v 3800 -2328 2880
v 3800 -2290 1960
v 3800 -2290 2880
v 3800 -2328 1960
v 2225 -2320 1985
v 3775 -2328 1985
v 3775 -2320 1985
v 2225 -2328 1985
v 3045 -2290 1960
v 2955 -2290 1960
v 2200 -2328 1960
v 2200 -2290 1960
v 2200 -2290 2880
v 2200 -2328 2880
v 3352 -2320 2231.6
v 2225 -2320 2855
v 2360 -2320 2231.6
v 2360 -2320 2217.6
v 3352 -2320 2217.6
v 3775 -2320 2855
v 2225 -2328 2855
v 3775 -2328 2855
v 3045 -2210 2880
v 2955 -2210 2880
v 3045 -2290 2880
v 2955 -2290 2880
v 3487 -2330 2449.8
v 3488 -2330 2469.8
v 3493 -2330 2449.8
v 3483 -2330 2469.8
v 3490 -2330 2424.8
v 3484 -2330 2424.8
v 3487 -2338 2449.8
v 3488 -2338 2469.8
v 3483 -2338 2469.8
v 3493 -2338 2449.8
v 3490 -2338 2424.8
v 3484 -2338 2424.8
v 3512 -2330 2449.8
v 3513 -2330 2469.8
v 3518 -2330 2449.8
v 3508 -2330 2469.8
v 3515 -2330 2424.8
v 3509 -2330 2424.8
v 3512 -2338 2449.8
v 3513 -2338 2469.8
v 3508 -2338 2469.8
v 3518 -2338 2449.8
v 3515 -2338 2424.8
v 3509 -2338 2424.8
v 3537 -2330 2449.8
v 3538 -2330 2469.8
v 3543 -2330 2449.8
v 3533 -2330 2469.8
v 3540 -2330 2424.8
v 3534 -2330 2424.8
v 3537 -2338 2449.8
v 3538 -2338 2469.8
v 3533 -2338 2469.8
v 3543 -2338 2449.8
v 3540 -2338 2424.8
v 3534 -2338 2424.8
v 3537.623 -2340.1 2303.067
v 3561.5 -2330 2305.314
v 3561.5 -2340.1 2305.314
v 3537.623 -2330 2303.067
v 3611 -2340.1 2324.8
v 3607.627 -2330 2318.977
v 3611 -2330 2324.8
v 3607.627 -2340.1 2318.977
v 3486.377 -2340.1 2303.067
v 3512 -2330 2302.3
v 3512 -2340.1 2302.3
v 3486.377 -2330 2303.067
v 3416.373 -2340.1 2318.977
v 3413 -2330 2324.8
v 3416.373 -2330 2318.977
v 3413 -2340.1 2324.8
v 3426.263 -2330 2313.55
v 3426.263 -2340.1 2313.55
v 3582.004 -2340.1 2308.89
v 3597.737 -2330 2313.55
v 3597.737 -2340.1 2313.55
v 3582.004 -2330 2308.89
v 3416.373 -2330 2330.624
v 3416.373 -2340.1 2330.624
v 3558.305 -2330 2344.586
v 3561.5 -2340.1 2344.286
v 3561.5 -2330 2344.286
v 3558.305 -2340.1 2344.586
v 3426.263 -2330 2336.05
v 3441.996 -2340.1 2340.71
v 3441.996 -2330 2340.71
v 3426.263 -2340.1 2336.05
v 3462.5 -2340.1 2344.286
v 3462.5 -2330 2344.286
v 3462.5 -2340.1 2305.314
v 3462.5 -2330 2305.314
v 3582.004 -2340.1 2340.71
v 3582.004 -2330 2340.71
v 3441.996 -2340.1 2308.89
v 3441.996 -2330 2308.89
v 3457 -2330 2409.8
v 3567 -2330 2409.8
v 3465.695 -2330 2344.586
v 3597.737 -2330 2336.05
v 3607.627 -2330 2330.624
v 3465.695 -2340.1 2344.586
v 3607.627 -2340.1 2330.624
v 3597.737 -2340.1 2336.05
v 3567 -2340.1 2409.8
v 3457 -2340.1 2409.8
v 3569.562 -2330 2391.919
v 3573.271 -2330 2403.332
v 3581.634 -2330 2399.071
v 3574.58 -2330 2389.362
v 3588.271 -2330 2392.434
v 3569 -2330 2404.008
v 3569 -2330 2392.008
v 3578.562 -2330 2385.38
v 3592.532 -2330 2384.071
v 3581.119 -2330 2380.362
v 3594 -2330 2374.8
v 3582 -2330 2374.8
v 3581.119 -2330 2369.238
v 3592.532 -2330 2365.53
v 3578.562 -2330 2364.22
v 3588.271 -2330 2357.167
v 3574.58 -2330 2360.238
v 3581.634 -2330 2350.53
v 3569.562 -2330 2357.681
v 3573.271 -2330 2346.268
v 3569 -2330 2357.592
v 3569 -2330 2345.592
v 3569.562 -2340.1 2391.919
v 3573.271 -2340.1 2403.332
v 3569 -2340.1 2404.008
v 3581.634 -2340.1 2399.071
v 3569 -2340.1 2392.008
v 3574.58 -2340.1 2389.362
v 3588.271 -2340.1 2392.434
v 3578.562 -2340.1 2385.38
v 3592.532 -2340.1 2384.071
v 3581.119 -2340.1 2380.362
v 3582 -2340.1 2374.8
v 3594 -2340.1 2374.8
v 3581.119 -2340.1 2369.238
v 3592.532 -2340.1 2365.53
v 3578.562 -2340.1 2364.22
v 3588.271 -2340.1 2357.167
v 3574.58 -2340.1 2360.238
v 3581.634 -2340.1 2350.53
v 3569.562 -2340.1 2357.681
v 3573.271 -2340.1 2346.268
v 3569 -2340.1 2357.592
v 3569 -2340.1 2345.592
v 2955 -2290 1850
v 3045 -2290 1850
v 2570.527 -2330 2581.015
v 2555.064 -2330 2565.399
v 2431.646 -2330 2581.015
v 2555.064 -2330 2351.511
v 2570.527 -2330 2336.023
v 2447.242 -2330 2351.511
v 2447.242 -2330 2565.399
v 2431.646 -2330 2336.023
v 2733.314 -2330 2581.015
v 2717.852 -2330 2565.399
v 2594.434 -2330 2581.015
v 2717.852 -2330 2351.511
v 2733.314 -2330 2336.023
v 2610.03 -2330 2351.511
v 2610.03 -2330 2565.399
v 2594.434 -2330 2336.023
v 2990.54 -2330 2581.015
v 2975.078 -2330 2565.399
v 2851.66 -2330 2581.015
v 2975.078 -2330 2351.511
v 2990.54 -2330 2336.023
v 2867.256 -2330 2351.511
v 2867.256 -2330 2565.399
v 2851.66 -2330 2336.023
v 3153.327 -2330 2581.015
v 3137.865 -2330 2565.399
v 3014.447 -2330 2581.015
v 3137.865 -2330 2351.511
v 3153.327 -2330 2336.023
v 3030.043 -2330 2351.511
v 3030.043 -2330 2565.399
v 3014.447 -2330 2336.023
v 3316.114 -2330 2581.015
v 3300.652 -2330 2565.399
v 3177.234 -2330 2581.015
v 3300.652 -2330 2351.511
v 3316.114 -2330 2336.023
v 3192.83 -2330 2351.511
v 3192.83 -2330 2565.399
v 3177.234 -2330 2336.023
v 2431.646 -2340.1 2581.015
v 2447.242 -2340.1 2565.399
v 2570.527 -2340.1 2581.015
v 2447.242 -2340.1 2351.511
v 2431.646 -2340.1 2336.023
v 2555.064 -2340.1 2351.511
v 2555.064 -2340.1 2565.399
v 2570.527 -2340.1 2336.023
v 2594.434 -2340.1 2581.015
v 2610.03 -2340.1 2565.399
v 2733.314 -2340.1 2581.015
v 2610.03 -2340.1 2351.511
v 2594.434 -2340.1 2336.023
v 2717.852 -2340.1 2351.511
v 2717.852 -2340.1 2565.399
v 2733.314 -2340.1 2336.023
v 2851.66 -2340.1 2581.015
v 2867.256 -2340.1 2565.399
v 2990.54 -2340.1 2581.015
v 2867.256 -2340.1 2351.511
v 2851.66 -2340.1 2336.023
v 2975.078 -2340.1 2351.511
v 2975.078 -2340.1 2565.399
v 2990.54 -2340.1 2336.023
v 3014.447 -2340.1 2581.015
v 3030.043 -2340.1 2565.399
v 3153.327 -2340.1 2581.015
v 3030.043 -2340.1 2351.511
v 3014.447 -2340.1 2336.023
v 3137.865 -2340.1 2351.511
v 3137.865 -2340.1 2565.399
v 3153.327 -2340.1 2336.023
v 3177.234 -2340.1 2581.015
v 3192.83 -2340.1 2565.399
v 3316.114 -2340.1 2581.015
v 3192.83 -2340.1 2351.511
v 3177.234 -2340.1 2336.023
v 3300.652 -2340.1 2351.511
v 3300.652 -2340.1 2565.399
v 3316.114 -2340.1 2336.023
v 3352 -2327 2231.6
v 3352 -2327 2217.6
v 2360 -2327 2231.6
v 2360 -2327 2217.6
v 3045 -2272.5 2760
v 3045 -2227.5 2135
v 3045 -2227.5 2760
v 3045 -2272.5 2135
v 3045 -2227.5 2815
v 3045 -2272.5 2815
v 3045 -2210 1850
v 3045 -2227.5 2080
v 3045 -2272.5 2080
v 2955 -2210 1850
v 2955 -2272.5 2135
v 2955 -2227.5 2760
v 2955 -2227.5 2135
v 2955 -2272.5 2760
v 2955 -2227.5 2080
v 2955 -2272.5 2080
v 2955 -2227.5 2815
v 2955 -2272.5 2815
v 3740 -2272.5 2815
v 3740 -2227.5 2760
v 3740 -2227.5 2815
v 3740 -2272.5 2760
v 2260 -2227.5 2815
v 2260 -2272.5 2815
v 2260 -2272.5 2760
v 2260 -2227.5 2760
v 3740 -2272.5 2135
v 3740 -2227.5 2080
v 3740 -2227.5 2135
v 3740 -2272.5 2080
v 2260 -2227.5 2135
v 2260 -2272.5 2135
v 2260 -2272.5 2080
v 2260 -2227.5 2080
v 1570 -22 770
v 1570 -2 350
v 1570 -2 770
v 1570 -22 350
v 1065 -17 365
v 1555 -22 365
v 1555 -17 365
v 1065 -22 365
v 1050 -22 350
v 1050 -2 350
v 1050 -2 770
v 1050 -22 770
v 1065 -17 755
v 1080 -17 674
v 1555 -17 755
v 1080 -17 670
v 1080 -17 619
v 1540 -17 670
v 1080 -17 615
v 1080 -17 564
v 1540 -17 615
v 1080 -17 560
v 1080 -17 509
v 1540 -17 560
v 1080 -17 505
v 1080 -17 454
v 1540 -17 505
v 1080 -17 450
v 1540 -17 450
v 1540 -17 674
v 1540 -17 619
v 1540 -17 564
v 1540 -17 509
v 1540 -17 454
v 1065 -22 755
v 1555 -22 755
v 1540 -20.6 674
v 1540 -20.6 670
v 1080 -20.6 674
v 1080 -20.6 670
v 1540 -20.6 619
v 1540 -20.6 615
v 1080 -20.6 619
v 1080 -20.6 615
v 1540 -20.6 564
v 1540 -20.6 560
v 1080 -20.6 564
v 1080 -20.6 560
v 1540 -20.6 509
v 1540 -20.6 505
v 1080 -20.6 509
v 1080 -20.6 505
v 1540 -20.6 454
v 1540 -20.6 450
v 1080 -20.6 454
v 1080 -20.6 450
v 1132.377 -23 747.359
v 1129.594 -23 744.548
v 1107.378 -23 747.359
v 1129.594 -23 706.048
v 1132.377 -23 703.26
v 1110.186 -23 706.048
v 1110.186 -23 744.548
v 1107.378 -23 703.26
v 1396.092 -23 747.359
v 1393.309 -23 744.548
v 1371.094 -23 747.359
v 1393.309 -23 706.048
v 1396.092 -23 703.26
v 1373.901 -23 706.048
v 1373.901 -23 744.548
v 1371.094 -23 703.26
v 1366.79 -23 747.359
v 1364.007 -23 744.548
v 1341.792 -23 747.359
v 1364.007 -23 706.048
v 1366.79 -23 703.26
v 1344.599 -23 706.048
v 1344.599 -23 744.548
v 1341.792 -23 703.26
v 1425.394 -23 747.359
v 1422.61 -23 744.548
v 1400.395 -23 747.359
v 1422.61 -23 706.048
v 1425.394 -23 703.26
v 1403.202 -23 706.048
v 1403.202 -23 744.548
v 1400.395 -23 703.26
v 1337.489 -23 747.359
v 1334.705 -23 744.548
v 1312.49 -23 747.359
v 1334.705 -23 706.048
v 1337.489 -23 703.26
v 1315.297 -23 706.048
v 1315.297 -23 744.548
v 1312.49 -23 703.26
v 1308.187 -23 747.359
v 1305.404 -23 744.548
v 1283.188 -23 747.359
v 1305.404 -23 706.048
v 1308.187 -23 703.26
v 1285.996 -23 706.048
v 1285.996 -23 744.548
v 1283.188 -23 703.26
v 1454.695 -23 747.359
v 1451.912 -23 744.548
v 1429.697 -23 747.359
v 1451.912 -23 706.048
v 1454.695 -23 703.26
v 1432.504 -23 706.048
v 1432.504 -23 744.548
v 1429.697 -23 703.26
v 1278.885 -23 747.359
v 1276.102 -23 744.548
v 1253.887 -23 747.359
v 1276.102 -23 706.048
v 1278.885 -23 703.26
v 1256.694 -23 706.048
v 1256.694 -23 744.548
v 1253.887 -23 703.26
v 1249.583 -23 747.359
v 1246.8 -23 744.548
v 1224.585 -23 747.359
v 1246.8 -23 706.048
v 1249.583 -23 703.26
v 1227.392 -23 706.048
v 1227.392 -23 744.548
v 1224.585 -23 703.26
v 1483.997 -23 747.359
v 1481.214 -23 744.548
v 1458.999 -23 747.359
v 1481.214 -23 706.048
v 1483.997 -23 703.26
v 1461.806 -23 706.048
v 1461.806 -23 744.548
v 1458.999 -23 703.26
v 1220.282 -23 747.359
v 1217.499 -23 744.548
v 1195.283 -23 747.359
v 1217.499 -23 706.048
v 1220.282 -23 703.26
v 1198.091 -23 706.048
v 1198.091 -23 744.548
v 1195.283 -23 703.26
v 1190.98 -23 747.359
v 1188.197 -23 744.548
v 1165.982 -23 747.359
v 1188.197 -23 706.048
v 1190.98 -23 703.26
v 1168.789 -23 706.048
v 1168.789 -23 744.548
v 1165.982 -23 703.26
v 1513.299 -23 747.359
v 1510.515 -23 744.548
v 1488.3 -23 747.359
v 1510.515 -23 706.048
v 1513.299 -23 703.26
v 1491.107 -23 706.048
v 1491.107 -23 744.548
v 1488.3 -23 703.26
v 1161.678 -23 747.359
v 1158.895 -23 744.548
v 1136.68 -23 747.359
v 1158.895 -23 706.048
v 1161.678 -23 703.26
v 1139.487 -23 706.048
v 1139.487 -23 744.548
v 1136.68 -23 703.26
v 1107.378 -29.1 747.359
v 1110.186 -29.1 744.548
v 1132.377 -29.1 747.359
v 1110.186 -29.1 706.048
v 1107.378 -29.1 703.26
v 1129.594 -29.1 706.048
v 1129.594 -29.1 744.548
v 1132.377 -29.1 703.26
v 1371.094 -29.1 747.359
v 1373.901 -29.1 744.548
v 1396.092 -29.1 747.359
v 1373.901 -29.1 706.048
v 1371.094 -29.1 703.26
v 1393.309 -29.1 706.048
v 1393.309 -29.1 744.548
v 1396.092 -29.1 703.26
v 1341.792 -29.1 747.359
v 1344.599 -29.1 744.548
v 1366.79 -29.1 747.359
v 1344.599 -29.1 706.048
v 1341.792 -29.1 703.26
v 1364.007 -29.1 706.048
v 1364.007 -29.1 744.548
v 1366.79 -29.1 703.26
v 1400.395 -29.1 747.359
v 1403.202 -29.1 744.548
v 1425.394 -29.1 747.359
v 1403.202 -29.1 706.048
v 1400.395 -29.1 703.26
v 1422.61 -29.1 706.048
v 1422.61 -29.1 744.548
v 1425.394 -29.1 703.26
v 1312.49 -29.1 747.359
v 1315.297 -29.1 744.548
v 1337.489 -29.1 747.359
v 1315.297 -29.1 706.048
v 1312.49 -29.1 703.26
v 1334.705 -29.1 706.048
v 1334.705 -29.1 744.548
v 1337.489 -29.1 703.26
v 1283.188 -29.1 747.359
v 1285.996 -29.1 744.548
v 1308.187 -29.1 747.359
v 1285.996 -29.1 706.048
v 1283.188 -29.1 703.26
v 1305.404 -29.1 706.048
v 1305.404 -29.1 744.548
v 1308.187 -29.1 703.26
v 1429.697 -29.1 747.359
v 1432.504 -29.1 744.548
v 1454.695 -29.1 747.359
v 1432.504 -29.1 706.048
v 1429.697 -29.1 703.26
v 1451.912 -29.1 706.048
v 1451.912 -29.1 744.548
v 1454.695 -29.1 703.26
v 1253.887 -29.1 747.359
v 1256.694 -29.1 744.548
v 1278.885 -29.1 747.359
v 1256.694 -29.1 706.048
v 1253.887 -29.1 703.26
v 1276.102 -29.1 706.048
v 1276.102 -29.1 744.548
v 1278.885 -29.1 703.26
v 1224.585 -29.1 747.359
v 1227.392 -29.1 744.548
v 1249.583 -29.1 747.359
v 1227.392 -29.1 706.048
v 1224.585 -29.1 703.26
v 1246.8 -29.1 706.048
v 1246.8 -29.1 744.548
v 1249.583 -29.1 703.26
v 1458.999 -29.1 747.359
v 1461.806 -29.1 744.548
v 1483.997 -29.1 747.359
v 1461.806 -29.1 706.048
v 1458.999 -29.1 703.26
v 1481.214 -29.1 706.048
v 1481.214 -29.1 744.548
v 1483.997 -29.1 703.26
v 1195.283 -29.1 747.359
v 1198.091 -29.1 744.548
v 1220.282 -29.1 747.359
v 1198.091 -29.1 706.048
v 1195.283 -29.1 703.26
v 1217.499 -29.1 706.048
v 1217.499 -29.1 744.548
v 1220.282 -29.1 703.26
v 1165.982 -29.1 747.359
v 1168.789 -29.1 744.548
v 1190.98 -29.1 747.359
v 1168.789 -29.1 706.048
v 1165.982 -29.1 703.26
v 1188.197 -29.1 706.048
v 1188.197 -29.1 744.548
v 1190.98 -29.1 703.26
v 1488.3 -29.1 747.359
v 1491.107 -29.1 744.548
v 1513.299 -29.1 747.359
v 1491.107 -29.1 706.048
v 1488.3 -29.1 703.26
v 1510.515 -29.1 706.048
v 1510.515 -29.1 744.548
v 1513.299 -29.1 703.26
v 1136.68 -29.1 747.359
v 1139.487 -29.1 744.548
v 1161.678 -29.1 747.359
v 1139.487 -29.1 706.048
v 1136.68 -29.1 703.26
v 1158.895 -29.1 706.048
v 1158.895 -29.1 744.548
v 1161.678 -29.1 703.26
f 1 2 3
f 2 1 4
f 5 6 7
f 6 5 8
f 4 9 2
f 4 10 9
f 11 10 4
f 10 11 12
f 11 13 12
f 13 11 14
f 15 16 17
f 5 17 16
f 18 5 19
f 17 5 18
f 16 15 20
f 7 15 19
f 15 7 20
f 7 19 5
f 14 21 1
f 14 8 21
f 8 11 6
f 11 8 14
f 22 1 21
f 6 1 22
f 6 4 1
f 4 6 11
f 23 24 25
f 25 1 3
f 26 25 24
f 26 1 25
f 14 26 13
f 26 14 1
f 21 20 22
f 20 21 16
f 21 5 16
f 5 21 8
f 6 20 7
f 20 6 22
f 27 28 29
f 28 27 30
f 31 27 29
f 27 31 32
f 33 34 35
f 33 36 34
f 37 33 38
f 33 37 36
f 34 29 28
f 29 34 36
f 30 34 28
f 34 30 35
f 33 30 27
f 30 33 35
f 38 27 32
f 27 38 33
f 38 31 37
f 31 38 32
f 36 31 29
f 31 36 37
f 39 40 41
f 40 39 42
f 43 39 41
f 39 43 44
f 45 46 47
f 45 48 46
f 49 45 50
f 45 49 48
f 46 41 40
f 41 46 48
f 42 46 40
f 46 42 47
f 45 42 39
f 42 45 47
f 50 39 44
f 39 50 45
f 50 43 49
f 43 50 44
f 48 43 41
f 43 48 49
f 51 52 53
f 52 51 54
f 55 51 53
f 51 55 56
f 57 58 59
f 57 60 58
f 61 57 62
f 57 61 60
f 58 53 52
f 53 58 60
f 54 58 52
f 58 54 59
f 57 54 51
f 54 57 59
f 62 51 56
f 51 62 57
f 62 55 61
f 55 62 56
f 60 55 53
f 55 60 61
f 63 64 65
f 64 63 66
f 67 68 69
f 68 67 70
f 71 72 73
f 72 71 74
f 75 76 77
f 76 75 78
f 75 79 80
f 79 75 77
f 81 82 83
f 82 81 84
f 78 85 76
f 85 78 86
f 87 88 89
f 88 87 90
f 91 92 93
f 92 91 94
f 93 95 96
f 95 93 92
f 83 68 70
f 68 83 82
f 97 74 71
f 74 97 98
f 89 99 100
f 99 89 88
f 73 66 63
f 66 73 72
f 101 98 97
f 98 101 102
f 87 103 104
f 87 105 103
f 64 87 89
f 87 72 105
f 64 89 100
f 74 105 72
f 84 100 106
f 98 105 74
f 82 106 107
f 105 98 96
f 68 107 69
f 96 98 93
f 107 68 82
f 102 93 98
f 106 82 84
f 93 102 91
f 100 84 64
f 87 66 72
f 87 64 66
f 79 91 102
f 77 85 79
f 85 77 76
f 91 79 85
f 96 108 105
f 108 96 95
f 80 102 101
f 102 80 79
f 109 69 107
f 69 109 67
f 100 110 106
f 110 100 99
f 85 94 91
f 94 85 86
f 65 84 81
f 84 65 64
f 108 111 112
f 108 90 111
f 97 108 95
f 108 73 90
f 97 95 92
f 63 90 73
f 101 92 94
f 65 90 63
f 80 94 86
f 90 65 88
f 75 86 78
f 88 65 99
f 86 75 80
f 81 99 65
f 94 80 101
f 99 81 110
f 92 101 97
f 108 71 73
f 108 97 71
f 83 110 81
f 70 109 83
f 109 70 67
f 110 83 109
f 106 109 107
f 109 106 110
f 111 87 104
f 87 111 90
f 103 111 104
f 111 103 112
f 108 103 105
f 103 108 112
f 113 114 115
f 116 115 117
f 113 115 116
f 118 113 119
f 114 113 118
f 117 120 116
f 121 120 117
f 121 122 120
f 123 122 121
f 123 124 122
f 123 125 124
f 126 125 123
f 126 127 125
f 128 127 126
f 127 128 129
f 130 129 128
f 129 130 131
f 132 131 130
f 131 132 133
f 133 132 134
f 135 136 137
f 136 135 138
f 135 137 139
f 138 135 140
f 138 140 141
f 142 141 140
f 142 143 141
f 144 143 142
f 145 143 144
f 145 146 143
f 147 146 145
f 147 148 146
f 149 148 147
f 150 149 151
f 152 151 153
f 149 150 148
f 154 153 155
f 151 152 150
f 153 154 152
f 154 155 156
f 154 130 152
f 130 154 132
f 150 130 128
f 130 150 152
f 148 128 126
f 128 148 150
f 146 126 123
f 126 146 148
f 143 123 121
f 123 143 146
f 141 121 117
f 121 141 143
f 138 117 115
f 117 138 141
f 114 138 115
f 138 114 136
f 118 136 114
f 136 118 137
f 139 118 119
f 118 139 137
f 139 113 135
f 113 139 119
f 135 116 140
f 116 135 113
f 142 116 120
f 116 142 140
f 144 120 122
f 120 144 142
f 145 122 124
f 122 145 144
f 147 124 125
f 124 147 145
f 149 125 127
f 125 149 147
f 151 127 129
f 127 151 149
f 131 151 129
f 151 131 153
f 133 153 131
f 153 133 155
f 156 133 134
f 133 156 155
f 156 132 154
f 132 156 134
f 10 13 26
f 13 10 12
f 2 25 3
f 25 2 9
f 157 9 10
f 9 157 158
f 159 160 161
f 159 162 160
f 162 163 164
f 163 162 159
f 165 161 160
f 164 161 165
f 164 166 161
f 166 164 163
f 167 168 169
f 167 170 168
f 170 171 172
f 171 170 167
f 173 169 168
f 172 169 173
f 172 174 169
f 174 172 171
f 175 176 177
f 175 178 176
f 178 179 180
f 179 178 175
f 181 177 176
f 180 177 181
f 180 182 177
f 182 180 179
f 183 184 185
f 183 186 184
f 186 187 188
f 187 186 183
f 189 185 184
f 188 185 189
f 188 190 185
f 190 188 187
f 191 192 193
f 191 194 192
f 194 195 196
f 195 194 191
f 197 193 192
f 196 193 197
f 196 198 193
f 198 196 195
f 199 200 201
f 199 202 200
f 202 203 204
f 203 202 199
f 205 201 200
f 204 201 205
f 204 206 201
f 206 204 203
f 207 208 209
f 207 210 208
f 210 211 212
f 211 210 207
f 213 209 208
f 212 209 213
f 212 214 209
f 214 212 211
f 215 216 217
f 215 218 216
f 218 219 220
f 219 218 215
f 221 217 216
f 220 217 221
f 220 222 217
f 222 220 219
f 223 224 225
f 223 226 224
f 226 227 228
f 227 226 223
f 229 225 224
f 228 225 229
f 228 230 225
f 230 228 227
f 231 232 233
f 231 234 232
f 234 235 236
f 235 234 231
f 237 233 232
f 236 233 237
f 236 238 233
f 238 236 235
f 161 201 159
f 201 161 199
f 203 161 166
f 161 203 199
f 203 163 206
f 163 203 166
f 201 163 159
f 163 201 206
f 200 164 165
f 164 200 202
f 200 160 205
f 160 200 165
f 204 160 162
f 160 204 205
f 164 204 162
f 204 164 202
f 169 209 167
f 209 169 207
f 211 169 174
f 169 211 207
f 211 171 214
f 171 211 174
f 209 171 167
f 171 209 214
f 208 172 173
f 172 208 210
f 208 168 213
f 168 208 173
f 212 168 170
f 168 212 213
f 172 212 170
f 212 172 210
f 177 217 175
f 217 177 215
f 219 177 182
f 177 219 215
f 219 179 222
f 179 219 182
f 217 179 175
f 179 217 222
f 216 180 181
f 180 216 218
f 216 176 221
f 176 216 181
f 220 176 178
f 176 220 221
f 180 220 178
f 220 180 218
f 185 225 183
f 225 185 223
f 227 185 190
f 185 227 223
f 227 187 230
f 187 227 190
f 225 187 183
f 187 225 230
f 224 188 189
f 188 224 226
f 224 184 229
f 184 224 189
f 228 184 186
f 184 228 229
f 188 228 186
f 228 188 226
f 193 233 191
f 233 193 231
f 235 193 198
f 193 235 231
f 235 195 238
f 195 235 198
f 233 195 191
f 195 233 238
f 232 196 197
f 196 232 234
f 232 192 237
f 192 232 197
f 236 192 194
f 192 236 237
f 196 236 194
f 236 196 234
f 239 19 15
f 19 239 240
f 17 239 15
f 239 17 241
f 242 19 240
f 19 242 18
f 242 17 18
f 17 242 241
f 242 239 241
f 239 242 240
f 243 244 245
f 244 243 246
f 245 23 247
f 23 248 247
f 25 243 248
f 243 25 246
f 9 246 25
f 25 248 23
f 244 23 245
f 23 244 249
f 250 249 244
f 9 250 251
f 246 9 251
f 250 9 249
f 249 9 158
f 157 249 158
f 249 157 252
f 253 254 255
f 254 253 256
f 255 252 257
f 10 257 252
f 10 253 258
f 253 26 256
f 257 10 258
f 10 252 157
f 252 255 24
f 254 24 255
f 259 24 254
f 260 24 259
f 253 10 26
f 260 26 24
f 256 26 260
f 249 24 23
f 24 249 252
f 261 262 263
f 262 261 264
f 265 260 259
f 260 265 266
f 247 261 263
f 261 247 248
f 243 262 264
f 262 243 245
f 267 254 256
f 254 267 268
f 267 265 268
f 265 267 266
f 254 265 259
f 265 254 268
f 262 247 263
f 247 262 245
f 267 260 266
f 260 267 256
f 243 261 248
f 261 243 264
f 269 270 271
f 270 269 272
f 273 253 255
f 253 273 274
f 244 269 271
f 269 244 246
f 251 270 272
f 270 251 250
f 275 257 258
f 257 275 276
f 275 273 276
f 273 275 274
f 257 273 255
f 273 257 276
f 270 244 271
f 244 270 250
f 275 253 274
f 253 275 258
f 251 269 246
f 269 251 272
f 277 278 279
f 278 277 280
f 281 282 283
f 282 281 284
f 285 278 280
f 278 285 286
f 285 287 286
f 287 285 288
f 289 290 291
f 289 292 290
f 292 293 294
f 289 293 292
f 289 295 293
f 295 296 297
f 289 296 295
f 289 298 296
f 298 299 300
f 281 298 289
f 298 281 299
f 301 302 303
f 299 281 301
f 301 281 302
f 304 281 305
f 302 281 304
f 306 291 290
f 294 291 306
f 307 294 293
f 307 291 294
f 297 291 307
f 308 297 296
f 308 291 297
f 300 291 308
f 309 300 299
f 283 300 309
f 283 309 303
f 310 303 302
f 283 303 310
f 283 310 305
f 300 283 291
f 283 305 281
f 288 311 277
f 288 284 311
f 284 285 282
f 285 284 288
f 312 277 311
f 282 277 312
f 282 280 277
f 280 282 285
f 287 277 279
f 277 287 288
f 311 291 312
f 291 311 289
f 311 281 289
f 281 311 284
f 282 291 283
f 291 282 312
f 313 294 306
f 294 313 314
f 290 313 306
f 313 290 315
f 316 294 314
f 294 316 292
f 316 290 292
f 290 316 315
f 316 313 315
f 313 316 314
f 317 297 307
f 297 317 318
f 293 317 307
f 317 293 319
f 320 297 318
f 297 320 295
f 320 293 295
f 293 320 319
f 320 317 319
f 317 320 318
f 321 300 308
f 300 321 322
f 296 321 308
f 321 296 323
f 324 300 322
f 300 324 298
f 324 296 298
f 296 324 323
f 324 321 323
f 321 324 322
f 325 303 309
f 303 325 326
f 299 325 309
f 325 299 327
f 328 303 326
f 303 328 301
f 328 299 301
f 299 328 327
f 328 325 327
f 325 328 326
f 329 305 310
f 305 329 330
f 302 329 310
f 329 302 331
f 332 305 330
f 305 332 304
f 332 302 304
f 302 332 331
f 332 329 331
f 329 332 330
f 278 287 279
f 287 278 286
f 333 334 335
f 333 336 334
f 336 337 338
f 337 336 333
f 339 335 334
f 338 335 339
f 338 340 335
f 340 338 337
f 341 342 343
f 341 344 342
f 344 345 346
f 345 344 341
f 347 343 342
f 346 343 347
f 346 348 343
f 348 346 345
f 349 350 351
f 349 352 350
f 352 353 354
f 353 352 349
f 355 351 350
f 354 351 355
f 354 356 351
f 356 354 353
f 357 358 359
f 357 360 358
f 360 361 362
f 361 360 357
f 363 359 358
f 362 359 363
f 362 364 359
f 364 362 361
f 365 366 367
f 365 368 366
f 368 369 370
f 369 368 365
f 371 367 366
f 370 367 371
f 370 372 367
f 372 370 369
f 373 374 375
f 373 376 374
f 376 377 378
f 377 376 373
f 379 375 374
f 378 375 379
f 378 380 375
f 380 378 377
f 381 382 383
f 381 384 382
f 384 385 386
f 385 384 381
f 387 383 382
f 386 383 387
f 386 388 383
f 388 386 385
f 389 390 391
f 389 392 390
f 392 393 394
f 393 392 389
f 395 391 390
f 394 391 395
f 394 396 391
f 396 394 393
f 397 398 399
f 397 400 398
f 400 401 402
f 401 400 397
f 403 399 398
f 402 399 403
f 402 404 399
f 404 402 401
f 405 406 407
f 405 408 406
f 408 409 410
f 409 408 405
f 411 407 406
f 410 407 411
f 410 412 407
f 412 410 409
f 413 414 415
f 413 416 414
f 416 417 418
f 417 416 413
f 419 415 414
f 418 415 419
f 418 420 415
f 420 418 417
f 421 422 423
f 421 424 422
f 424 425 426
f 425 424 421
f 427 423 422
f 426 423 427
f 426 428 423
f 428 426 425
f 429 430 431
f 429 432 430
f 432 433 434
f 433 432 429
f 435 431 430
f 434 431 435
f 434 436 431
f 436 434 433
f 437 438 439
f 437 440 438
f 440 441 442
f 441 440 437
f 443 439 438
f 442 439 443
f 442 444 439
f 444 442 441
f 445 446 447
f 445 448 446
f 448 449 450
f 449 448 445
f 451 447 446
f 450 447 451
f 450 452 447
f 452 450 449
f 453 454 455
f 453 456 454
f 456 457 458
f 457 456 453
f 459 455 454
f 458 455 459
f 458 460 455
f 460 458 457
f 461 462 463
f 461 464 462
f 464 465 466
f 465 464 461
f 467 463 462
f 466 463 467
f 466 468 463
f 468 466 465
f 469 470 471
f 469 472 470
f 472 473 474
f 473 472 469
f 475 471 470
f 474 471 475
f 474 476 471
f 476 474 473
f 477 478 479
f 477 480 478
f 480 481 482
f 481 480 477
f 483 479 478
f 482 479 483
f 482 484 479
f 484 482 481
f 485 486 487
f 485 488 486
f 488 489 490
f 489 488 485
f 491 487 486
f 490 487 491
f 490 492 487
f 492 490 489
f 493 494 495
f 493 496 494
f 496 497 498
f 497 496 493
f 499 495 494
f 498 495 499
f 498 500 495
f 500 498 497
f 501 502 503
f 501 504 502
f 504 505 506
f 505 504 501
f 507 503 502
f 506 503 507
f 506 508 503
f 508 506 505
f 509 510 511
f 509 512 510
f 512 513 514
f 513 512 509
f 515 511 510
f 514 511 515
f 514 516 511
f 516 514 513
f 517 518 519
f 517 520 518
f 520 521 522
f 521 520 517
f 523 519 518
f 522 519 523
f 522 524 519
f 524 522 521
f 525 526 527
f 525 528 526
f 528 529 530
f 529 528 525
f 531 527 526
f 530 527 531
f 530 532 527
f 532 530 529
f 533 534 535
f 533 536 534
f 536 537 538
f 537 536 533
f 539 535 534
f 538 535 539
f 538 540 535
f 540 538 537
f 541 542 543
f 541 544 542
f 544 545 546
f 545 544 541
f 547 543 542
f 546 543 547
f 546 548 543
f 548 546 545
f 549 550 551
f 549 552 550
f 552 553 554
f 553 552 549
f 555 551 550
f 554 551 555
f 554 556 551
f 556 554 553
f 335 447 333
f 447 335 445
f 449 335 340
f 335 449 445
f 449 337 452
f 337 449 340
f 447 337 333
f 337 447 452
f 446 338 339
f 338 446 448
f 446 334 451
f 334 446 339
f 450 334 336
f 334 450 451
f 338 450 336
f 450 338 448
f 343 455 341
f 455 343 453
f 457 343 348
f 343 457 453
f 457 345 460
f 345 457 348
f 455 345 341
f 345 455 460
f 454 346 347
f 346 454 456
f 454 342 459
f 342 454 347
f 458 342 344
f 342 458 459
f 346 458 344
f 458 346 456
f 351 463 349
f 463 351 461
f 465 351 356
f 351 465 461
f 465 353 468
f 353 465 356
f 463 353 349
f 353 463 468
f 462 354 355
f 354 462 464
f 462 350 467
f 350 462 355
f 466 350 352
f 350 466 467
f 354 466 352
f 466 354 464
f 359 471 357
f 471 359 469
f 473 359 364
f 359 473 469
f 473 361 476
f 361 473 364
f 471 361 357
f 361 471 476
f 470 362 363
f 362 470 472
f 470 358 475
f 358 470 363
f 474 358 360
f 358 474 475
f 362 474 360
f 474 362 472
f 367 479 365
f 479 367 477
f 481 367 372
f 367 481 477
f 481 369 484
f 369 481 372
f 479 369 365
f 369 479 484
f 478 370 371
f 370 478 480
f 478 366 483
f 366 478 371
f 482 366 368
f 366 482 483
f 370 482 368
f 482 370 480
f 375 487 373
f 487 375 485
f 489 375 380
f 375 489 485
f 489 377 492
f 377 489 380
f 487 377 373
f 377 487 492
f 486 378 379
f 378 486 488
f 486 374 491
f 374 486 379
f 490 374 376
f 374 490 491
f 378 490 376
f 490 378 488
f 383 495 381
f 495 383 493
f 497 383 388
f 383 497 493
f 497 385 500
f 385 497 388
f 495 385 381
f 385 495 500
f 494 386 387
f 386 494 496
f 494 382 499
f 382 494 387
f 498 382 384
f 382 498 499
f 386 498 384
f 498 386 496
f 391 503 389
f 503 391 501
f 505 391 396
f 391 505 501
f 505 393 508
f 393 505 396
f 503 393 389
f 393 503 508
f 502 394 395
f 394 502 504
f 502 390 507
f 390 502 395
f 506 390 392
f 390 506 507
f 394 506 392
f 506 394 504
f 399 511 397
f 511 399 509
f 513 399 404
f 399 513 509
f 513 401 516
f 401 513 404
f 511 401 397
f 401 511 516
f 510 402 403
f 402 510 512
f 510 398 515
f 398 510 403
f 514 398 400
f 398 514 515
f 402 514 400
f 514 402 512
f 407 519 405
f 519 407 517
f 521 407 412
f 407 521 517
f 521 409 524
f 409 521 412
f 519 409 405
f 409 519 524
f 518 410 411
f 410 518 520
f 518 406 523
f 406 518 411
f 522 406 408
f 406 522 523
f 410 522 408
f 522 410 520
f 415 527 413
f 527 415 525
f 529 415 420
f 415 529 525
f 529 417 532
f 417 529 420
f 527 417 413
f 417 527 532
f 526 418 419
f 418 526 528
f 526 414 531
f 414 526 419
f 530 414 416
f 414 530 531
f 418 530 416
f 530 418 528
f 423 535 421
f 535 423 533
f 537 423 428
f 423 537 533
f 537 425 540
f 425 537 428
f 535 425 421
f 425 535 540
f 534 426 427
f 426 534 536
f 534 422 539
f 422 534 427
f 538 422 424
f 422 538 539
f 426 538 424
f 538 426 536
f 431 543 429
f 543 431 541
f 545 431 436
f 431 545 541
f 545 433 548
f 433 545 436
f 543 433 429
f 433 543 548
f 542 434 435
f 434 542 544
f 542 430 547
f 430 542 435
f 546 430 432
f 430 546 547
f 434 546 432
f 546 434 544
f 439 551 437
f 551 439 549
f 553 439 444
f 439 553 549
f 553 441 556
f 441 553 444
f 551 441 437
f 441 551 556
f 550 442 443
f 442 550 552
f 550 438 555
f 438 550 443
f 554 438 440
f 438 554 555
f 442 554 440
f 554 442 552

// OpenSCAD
// file: tea_shop_signage_parameters.scad
// =============================================================================
// TEA SHOP DIORAMA — SIGNAGE PARAMETERS (3D TAMIL "டீ கடை")
// =============================================================================
// All units: mm (1000 mm = 1.0 m), 1:1 real-world scale (1000 units = 1 GTA unit).
// Shared global coordinate system (identical to Groups 1–4):
//   +X -> left -> right  (0 = left outer wall, BUILD_W = right outer wall)
//   +Y -> front -> back  (0 = front eave wall, BUILD_D = back wall)
//   +Z -> up             (0 = ground / plinth top datum)
// =============================================================================

// --- SHARED GLOBAL VARIABLES (Reused from Groups 1–4) ------------------------
WALL_T             = 250;   // wall panel thickness
BUILD_W            = 6000;  // building width along X (6.00 m)
BUILD_D            = 4000;  // building depth along Y (4.00 m)
BACK_H             = 3200;  // wall height at BACK (tall side)
FRONT_H            = 2400;  // wall height at FRONT eave (short side)

// Group 1 front opening & plinth references:
left_pier_width    = 600;
window_width       = 3400;
mid_pier_width     = 500;
door_width         = 1000;
sill_height        = 900;

window_left        = left_pier_width;                   // 600 mm
window_right       = window_left + window_width;        // 4000 mm
door_left          = window_right + mid_pier_width;     // 4500 mm
door_right         = door_left + door_width;            // 5500 mm

// Group 2/3 roof slope derivation:
ROOF_RISE          = BACK_H - FRONT_H;                 // 800 mm
ROOF_RUN           = BUILD_D;                           // 4000 mm
ROOF_ANGLE         = atan(ROOF_RISE / ROOF_RUN);        // ~11.3099°

// Group 3 pergola structure references:
POST_SIZE          = 100;
POST_Y             = -2250;                             // front post line (mm)
MAIN_BEAM_WIDTH    = 80;
MAIN_BEAM_HEIGHT   = 120;
CROSS_BEAM_WIDTH   = 80;
CROSS_BEAM_HEIGHT  = 100;
PERGOLA_EAVE_Z     = FRONT_H;
POST_HEIGHT        = PERGOLA_EAVE_Z - abs(POST_Y) * tan(ROOF_ANGLE) - CROSS_BEAM_HEIGHT - MAIN_BEAM_HEIGHT;


// =============================================================================
// SIGNAGE PARAMETERS — ACCURATE SCALE & FACADE POSITIONING
// =============================================================================

// --- 1. Main Hanging Signboard ("டீ கடை") --------------------------------------
// REFERENCE OBSERVATIONS (Images 9b1fed6bc4, 0d34e93fe1, 9cc7378ff7):
// - Positioned centered directly on the front facade: X = BUILD_W / 2 = 3000 mm.
// - Dimensions: 1600 mm wide x 920 mm high, 30 mm thick base plate.
// - Raised outer protective rim border (25 mm wide, 8 mm projection).
// - 3D Tamil typography: "டீ கடை" (Tea Kadai) extruded in bold 3D letters.
// - Decorative separator line + authentic 3D tea cup graphic on right side.
// - Bottom edge rests directly on top of the front pergola canopy / beam line.
HANGING_SIGN_W     = 1600;  // signboard width along X (mm)
HANGING_SIGN_H     = 920;   // signboard height along Z (mm)
HANGING_SIGN_T     = 30;    // board base plate thickness along Y (mm)
HANGING_SIGN_RIM_W = 25;    // width of outer raised border frame (mm)
HANGING_SIGN_RIM_T = 8;     // projection of outer border frame (mm)
HANGING_SIGN_LET_T = 10;    // extrusion depth of 3D Tamil text & graphics (mm)

HANGING_SIGN_X     = BUILD_W / 2; // Centered at X = 3000 mm on front facade
HANGING_SIGN_Y     = POST_Y - MAIN_BEAM_WIDTH / 2 - HANGING_SIGN_T; // sitting on front face of beam
// Elevation: bottom rests flush on top of the pergola canopy eave line:
HANGING_SIGN_Z     = PERGOLA_EAVE_Z - abs(POST_Y) * tan(ROOF_ANGLE) + 10; // ≈ 1960 mm


// --- 2. Sign Bracket / Mounting Framework ------------------------------------
// Timber framework supporting the sign from behind, anchoring it to the pergola:
BRACKET_POST_W     = 90;    // upright support timber width along X (mm)
BRACKET_POST_D     = 80;    // upright support timber depth along Y (mm)
BRACKET_POST_TOP_Z = HANGING_SIGN_Z + HANGING_SIGN_H;
BRACKET_POST_H     = BRACKET_POST_TOP_Z - (POST_HEIGHT + MAIN_BEAM_HEIGHT);

BRACKET_BATTEN_W   = HANGING_SIGN_W - 120; // rear cross-batten width along X (mm)
BRACKET_BATTEN_D   = 45;                   // rear cross-batten depth along Y (mm)
BRACKET_BATTEN_H   = 55;                   // rear cross-batten height along Z (mm)


// --- 3. Front Wall Price List Sign ("விலைப்பட்டியல்") ------------------------
// REFERENCE OBSERVATIONS (Images 9b1fed6bc4, 8ffafd36e4):
// - Mounted flat on the exterior front knee-wall sill, beneath the service window.
// - Dimensions: 520 mm wide x 420 mm high x 15 mm thick.
// - Outer frame rim (15 mm wide) + 3D Tamil header "விலைப்பட்டியல்" (Price List).
PRICE_SIGN_W       = 520;   // width along X (mm)
PRICE_SIGN_H       = 420;   // height along Z (mm)
PRICE_SIGN_T       = 15;    // thickness along Y (mm)
PRICE_SIGN_RIM_W   = 15;    // border rim width (mm)
PRICE_SIGN_RIM_T   = 5;     // border rim thickness (mm)
PRICE_SIGN_LET_T   = 6;     // text/lines extrusion depth (mm)

PRICE_SIGN_X       = window_left + 450; // X = 1050 mm
PRICE_SIGN_Y       = -PRICE_SIGN_T - 2; // 2 mm proud of front wall (prevents z-fighting)
PRICE_SIGN_Z       = 350;               // centered vertically on the 900mm sill
// main file
// =============================================================================
// tea_shop_signage_assemble.scad — SIGNAGE GROUP: ASSEMBLED PREVIEW
// =============================================================================
// Visual verification ONLY — not for export.
// Press F5 in OpenSCAD to preview all signage parts.
// Use individual part_*.scad files to export each component as a standalone OBJ.
// =============================================================================

include <tea_shop_signage_modules.scad>;

assemble();
